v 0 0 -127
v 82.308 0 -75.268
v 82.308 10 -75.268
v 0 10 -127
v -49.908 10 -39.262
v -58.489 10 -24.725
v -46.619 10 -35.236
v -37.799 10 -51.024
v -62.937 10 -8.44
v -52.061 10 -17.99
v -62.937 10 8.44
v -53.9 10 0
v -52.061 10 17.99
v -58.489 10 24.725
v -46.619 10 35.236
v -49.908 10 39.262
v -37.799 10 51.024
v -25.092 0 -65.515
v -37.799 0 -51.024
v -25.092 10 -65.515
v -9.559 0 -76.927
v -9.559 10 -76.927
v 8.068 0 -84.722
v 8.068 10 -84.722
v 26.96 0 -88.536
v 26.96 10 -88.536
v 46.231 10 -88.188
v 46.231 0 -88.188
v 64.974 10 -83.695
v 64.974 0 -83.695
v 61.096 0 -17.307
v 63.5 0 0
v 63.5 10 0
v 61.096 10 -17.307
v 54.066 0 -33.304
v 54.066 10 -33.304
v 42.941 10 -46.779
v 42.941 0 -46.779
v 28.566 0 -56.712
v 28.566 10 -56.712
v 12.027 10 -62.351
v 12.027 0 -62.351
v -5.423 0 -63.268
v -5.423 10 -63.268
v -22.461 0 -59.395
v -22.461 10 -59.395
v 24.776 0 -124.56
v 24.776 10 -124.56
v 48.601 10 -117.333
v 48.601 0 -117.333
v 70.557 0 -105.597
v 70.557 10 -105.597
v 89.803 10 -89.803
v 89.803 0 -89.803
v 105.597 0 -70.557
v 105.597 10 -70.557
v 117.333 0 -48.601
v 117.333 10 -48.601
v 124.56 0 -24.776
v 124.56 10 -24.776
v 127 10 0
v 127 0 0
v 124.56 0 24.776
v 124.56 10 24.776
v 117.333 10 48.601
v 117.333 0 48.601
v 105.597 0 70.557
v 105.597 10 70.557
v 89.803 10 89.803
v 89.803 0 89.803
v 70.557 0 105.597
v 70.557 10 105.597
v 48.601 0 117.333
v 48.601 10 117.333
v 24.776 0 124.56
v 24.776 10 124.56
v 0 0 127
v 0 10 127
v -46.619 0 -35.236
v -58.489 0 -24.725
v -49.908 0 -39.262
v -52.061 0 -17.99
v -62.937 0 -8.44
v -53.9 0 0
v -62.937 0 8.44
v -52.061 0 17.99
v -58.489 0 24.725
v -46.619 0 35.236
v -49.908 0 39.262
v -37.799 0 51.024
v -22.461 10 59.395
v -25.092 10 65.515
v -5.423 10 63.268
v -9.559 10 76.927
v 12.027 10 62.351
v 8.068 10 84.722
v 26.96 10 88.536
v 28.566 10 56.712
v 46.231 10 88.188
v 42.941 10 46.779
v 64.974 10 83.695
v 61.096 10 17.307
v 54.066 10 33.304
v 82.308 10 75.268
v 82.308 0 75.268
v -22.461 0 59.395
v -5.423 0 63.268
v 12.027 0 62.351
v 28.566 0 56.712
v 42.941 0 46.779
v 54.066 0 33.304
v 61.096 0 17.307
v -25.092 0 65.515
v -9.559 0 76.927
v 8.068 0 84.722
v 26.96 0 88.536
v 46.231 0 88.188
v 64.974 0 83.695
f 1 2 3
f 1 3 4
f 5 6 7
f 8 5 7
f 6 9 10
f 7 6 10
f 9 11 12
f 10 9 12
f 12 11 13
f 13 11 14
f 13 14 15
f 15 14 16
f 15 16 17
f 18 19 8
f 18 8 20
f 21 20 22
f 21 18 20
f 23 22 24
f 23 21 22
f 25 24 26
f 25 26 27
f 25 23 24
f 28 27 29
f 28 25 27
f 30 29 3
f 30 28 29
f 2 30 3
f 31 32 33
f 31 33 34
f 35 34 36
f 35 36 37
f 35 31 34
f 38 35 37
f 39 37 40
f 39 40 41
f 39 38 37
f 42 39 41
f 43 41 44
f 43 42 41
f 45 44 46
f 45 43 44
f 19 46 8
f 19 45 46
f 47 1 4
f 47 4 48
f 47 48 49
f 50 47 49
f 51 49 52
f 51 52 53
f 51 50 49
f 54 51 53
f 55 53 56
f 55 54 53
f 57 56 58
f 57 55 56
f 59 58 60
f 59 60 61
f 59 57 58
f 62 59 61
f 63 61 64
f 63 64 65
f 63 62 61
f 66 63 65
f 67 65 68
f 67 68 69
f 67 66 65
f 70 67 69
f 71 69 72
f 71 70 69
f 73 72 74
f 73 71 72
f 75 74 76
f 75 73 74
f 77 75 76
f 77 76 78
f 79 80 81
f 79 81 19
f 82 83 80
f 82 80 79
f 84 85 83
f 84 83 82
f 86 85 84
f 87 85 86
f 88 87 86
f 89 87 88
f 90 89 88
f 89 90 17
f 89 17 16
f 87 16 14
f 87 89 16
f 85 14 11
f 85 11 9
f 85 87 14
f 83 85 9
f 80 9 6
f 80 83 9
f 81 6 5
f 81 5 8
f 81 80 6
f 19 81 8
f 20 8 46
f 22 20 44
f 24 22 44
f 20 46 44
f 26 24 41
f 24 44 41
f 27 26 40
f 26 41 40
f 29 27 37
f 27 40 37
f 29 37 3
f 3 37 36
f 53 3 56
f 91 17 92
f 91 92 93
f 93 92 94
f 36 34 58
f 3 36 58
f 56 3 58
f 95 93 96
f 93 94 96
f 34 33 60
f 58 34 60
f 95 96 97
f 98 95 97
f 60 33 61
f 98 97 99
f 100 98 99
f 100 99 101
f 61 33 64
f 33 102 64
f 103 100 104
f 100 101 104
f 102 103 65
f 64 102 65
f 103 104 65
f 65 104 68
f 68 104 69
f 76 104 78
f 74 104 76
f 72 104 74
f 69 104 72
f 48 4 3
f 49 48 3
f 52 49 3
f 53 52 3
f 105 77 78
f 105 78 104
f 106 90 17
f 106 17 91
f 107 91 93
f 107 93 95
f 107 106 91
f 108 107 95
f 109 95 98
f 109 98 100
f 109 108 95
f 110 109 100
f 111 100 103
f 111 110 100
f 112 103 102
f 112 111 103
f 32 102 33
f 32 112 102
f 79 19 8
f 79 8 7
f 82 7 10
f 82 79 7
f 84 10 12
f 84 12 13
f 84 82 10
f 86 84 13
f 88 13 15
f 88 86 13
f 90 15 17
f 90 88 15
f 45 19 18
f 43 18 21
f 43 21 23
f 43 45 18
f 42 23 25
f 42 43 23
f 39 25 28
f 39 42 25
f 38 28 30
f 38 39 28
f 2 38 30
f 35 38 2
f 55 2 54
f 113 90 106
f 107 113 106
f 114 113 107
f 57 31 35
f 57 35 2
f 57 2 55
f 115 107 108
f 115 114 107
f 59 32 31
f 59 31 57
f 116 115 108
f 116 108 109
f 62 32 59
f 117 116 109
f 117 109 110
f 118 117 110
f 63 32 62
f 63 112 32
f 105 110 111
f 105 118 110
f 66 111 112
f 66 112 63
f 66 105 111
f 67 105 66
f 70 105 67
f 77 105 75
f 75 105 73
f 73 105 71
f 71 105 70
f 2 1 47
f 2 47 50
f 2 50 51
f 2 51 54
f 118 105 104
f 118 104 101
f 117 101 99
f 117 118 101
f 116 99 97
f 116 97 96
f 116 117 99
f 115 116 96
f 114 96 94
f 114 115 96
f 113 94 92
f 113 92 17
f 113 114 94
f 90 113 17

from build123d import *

# Parameters (mm, degrees)
F1_DEPTH = 10


with BuildPart() as f1:
    # F0 (on Front) → F1 (new body)
    with BuildSketch(Plane.XZ):
        with BuildLine():
            ThreePointArc((0, -127), (89.8025612107, -89.8025612107), (127, 0))
            ThreePointArc((127, 0), (89.8025612107, 89.8025612107), (0, 127))
            Line((0, 127), (82.3076020381, 75.2675281207))
            ThreePointArc((82.3076020381, 75.2675281207), (112.8102044117, 42.9974660812), (123.9, 0))
            ThreePointArc((123.9, 0), (112.8102044117, -42.9974660812), (82.3076020381, -75.2675281207))
            Line((82.3076020381, -75.2675281207), (0, -127))
        make_face()
        with BuildLine():
            ThreePointArc((123.9, 0), (112.8102044117, 42.9974660812), (82.3076020381, 75.2675281207))
            ThreePointArc((82.3076020381, 75.2675281207), (17.4103746568, 87.1424987035), (-37.7994285714, 51.0240453088))
            ThreePointArc((-37.7994285714, 51.0240453088), (28.5655936899, 56.7120521331), (63.5, 0))
            ThreePointArc((63.5, 0), (28.5655936899, -56.7120521331), (-37.7994285714, -51.0240453088))
            ThreePointArc((-37.7994285714, -51.0240453088), (17.4103746568, -87.1424987035), (82.3076020381, -75.2675281207))
            ThreePointArc((82.3076020381, -75.2675281207), (112.8102044117, -42.9974660812), (123.9, 0))
        make_face()
    extrude(amount=-F1_DEPTH)


with BuildPart() as f1b:
    # F0 (on Front) → F1, piece 2 (new body)
    with BuildSketch(Plane.XZ):
        with BuildLine():
            ThreePointArc((-37.7994285714, -51.0240453088), (-53.9, 0), (-37.7994285714, 51.0240453088))
            ThreePointArc((-37.7994285714, 51.0240453088), (-63.5, 0), (-37.7994285714, -51.0240453088))
        make_face()
    extrude(amount=-F1_DEPTH)


solid = Compound([f1.part, f1b.part])
